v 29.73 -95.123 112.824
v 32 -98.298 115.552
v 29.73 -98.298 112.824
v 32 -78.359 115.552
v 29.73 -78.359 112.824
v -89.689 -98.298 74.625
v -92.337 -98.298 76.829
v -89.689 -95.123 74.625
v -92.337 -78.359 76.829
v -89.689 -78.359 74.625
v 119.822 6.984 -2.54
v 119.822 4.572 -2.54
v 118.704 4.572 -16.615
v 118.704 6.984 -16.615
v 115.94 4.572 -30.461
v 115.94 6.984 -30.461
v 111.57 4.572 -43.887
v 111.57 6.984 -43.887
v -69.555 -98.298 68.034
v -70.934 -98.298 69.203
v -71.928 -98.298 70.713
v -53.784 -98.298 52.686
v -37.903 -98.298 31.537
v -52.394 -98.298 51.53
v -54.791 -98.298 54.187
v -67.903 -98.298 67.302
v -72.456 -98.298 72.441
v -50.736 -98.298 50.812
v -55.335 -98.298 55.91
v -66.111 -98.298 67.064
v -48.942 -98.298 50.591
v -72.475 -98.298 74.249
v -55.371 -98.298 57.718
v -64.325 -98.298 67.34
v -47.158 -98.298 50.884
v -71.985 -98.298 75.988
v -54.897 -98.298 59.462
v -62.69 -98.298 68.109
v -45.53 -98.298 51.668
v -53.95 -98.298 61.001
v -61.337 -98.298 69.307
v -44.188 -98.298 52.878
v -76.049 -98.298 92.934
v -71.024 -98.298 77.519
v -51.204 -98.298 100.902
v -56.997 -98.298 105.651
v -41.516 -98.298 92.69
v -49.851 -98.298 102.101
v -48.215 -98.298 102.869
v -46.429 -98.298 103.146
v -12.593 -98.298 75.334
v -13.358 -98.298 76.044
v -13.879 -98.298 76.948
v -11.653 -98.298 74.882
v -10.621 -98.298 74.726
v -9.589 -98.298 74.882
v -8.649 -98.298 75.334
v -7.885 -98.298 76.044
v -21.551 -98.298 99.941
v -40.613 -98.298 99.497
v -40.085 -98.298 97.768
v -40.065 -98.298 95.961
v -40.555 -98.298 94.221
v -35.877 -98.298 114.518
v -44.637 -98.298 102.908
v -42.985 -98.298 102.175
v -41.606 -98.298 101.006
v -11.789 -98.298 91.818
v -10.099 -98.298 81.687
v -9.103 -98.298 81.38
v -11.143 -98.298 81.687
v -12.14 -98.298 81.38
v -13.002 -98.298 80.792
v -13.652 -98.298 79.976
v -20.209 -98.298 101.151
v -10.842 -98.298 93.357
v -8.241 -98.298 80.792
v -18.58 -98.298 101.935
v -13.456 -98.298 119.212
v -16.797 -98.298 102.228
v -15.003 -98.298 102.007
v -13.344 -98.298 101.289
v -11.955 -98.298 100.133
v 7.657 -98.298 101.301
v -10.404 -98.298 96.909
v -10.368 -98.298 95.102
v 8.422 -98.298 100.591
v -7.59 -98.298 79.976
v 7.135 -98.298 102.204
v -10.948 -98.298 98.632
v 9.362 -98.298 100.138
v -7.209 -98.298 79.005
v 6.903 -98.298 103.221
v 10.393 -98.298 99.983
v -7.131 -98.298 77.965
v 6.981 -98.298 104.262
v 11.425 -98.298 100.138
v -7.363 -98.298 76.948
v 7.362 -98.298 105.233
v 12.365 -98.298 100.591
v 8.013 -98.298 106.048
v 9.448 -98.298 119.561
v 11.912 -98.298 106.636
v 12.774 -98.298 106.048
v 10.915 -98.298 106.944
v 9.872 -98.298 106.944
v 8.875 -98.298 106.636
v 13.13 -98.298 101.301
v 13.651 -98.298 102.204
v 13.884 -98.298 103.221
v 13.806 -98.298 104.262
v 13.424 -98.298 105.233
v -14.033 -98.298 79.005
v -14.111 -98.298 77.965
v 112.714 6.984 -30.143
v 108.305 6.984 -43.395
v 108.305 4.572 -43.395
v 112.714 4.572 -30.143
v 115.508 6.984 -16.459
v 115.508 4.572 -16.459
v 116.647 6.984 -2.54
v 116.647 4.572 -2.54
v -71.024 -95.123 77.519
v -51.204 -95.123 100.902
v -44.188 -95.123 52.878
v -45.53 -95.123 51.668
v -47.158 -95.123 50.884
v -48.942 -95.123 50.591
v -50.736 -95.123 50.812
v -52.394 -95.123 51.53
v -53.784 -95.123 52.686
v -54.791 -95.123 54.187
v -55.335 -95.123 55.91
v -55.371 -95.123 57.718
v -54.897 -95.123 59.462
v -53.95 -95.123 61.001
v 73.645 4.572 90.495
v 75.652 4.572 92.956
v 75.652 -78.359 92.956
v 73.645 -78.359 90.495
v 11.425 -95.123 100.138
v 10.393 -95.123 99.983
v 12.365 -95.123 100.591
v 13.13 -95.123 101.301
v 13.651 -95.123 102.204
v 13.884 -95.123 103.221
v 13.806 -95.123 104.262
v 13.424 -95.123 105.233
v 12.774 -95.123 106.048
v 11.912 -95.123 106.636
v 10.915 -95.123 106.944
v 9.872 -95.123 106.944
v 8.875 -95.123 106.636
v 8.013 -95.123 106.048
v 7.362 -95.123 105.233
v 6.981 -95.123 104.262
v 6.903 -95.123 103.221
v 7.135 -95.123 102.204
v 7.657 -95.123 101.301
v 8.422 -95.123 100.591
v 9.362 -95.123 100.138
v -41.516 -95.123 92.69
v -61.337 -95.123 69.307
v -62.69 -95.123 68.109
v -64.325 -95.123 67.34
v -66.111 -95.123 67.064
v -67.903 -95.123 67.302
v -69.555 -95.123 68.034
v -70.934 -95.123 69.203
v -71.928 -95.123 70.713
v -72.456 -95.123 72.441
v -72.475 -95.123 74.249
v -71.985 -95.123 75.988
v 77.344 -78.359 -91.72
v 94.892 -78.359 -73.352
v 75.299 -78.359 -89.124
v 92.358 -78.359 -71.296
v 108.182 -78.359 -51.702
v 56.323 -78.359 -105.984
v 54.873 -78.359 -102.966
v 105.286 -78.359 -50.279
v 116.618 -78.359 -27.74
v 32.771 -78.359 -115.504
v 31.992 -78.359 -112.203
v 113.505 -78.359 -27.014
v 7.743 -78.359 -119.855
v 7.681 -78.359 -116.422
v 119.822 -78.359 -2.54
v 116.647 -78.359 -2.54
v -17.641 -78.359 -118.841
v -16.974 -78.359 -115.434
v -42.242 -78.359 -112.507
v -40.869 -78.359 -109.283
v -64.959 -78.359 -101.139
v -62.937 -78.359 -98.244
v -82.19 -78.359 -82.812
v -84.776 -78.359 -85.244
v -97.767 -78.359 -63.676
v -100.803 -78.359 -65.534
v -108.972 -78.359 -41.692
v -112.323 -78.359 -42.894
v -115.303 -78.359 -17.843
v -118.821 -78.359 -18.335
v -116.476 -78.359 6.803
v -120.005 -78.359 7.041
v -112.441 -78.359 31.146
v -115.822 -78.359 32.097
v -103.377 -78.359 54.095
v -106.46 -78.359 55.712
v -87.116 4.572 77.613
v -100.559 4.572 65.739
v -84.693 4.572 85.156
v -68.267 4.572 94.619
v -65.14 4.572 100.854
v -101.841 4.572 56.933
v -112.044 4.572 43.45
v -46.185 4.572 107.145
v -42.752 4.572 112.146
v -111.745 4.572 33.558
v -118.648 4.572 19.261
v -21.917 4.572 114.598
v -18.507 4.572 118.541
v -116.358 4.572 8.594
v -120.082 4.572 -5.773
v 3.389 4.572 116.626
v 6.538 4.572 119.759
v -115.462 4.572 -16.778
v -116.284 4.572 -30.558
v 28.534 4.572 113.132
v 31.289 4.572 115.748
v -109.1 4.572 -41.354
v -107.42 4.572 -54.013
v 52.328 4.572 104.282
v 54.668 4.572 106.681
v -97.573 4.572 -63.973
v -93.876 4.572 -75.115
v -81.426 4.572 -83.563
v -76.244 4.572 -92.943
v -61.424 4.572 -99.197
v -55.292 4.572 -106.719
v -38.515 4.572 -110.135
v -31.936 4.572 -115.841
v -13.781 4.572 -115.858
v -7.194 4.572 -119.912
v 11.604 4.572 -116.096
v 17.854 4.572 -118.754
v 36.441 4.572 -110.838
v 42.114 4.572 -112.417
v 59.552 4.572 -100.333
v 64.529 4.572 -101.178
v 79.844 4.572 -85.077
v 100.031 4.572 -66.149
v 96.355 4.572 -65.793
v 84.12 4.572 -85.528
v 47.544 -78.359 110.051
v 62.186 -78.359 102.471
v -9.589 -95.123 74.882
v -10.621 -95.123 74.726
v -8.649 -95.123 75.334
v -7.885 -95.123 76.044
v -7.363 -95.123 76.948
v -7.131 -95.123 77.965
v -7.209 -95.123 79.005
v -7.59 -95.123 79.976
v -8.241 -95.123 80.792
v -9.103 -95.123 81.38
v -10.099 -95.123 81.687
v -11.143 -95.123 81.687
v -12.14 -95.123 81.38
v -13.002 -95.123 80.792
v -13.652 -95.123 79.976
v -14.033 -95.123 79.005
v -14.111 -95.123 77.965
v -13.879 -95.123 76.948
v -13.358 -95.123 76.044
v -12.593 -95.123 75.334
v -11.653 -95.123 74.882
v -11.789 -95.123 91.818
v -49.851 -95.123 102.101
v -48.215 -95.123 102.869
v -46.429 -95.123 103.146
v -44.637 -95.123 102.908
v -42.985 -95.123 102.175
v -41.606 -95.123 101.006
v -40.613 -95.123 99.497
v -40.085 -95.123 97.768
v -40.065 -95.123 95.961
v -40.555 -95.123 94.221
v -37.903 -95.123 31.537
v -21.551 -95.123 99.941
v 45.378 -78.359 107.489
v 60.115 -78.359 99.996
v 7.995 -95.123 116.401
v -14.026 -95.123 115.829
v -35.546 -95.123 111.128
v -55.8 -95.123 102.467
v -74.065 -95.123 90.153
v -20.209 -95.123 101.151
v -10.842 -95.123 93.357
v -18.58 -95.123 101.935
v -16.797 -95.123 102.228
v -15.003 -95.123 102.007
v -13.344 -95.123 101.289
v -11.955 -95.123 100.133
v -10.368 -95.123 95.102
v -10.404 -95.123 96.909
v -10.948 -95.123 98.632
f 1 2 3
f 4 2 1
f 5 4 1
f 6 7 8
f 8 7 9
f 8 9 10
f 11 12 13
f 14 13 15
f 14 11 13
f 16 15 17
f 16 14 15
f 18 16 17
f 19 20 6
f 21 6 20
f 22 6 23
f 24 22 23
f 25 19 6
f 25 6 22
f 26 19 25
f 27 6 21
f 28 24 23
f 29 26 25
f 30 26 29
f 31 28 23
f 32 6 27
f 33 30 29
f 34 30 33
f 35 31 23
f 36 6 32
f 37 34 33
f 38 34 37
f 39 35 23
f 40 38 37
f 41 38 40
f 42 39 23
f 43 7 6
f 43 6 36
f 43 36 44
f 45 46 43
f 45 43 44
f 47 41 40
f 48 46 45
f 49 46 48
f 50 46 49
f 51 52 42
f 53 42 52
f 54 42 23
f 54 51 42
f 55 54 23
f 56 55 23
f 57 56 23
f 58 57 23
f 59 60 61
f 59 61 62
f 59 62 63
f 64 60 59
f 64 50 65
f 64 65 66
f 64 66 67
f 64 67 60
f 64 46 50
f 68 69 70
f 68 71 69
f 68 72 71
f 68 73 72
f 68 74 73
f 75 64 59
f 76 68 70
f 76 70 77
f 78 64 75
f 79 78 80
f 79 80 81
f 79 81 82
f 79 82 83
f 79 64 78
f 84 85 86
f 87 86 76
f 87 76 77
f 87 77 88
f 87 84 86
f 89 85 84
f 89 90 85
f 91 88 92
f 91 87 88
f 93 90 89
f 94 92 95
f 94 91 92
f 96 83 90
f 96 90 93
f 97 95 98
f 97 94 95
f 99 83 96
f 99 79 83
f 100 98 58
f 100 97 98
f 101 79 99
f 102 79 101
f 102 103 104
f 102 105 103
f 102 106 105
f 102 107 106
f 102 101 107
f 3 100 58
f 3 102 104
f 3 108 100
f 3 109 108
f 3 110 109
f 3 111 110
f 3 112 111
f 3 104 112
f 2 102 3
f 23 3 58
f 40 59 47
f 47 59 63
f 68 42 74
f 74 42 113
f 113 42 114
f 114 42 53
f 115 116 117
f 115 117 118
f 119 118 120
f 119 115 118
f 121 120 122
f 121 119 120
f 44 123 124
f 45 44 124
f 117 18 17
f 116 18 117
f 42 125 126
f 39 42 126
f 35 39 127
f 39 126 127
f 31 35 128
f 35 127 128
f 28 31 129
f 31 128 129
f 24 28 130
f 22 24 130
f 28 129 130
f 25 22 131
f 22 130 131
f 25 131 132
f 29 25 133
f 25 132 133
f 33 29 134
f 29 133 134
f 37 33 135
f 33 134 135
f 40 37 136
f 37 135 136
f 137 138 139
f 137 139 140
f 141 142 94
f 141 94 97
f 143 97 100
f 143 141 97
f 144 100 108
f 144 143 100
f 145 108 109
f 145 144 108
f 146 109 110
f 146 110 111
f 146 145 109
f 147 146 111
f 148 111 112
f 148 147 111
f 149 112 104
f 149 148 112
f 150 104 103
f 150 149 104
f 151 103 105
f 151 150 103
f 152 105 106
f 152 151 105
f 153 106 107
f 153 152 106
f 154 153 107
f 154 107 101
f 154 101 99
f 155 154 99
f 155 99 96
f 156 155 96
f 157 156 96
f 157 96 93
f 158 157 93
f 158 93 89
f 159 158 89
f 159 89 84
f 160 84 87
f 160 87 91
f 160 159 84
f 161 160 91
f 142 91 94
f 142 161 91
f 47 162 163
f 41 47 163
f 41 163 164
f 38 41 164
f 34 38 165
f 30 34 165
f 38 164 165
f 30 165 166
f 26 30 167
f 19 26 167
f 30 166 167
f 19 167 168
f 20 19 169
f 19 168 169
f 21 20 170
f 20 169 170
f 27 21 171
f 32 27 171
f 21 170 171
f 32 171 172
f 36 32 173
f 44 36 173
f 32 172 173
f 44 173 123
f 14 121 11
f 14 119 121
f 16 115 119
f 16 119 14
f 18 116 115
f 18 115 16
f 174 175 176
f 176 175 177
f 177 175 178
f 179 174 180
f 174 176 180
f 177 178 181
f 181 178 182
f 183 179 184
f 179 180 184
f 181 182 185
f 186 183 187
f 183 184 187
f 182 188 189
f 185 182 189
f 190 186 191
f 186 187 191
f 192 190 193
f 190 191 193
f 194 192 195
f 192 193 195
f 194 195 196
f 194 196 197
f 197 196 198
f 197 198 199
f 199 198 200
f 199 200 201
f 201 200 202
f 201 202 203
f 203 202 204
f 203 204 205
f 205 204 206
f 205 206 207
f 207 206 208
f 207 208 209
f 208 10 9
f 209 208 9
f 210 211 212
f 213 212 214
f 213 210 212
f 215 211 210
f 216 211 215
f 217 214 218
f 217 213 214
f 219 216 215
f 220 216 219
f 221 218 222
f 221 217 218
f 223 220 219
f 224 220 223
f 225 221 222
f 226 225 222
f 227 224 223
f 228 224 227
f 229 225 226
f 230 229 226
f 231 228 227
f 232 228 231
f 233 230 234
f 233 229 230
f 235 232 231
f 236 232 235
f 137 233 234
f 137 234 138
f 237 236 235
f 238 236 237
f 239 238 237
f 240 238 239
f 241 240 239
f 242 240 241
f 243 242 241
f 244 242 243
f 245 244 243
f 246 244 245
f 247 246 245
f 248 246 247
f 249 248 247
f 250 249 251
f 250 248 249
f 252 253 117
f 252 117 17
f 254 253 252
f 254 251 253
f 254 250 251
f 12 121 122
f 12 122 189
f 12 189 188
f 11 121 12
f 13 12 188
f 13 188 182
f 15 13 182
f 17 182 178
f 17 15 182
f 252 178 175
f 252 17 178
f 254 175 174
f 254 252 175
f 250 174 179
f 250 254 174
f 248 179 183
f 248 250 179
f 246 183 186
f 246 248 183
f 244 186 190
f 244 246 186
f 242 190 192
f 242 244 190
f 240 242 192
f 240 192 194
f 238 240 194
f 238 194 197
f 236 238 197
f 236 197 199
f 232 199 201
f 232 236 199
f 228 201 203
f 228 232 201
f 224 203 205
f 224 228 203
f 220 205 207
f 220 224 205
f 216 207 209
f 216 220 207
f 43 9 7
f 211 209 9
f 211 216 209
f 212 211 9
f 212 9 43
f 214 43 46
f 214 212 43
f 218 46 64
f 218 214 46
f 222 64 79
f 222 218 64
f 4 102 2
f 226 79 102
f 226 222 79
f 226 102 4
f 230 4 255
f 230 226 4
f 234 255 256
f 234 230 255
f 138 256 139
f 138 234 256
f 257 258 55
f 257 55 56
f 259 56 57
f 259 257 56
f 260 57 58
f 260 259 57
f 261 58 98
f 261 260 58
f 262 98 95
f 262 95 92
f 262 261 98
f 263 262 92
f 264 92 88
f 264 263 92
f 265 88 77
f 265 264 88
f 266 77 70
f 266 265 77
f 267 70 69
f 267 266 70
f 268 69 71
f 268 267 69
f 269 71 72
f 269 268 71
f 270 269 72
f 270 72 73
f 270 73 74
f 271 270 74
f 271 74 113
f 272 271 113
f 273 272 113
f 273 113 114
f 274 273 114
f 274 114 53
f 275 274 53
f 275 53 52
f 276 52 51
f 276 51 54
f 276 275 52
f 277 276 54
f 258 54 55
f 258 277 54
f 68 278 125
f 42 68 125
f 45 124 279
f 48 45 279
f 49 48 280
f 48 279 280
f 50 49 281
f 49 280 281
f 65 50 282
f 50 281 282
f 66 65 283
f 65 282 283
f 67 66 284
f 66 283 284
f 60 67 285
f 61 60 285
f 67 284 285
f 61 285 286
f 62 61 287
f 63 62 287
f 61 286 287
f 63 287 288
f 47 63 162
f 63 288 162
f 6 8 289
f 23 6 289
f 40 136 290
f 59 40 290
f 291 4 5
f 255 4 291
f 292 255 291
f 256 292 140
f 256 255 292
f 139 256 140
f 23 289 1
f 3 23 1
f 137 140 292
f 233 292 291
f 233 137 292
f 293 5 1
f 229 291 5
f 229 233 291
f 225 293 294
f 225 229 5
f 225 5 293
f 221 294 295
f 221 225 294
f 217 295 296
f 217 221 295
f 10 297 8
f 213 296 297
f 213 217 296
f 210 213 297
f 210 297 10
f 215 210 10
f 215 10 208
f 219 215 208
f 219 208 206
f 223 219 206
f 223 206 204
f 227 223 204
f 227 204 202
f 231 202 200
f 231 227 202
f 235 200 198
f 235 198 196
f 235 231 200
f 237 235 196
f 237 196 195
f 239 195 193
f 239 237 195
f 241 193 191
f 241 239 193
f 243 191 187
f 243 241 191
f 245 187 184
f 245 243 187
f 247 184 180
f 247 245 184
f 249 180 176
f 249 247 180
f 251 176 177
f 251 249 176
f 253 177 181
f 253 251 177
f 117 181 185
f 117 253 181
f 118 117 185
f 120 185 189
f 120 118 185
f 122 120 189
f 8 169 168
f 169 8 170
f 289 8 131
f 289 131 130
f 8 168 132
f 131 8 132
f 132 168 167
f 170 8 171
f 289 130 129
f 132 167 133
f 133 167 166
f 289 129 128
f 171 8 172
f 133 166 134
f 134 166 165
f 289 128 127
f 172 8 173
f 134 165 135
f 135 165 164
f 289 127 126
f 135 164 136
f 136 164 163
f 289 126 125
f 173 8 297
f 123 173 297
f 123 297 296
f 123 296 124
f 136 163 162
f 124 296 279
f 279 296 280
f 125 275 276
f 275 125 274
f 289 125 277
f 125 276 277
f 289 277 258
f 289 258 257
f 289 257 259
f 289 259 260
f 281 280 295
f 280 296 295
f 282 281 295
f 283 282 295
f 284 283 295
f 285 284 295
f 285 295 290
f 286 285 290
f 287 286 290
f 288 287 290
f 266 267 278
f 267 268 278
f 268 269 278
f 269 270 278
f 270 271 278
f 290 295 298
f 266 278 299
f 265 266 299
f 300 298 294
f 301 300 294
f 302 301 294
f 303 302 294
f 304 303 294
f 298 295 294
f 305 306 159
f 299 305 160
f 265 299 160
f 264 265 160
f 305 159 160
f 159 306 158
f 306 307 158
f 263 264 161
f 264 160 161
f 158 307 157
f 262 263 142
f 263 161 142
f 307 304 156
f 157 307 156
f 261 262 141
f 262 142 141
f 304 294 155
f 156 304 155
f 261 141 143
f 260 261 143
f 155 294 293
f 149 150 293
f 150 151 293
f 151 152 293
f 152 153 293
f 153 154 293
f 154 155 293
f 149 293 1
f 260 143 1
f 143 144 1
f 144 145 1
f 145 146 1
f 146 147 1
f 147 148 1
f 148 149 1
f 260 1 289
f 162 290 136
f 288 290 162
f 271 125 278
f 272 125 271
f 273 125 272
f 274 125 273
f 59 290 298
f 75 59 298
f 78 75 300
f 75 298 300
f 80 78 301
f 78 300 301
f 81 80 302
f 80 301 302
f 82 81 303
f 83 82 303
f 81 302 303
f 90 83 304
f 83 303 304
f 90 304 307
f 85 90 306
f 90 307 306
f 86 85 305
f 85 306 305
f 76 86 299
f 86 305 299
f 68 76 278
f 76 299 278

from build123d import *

# Parameters (mm, degrees)
BASE_FLANGE1_DEPTH  = 98.298
CUT_EXTRUDE1_START  = -19.939
CUT_EXTRUDE1_DEPTH  = 19.939
BOSS_EXTRUDE3_START = -3.175
SKETCH13_R          = 3.5
BOSS_EXTRUDE3_DEPTH = 3.175
BOSS_EXTRUDE4_START = 4.572
BOSS_EXTRUDE4_DEPTH = 4.572
BOSS_EXTRUDE5_START = 2.4115014
BOSS_EXTRUDE5_DEPTH = 2.4115014


# Sheet-metal steps are written as plain solids
with BuildPart() as part:
    # Sketch3 → Base-Flange1 (new body)
    with BuildSketch(Plane(origin=(0, 0, 0), x_dir=(1, 0, 0), z_dir=(0, 1, 0))):
        with BuildLine():
            Line((116.647348933, 2.54), (119.822348933, 2.54))
            ThreePointArc((119.822348933, 2.54), (-109.127582861, 50.474671088), (75.651891683, -92.955973295))
            Line((75.651891683, -92.955973295), (73.645289253, -90.495452836))
            ThreePointArc((73.645289253, -90.495452836), (-105.909021844, 48.952371802), (116.647348933, 2.54))
        make_face()
    extrude(amount=-BASE_FLANGE1_DEPTH)

    # Sketch11 → Cut-Extrude1 (cut)
    with BuildSketch(Plane.XZ.offset(98.298).offset(CUT_EXTRUDE1_START)):
        with BuildLine():
            Line((32.000435674, 115.55214828), (29.730194096, 112.823628607))
            ThreePointArc((29.730194096, 112.823628607), (52.879669985, 104.003827407), (73.645289253, 90.495452836))
            Line((73.645289253, 90.495452836), (75.651891683, 92.955973295))
            ThreePointArc((75.651891683, 92.955973295), (54.995189309, 106.512393046), (32.000435674, 115.55214828))
        make_face()
        with BuildLine():
            Line((-92.337333522, 76.828501251), (-89.68916988, 74.625119225))
            ThreePointArc((-89.68916988, 74.625119225), (-40.869300957, -109.282916562), (116.647348933, -2.54))
            Line((116.647348933, -2.54), (119.822348933, -2.54))
            ThreePointArc((119.822348933, -2.54), (-42.24188113, -112.507437016), (-92.337333522, 76.828501251))
        make_face()
    extrude(amount=CUT_EXTRUDE1_DEPTH, mode=Mode.SUBTRACT)

    # Sketch13 → Boss-Extrude3 (add)
    with BuildSketch(Plane.XZ.offset(98.298).offset(BOSS_EXTRUDE3_START)):
        with BuildLine():
            Line((-37.903446615, 31.537248793), (29.730194096, 112.823628607))
            ThreePointArc((29.730194096, 112.823628607), (-35.546465704, 111.128323973), (-89.68916988, 74.625119225))
            Line((-89.68916988, 74.625119225), (-37.903446615, 31.537248793))
        make_face()
        with Locations(Location((-10.621108202, 78.226237974, 0), (0, 0, 270))):
            Circle(SKETCH13_R, mode=Mode.SUBTRACT)
        with Locations(Location((10.39338393, 103.482781479, 0), (0, 0, 270))):
            Circle(SKETCH13_R, mode=Mode.SUBTRACT)
        with BuildLine():
            Line((-53.950312206, 61.001291051), (-21.551148637, 99.940651521))
            ThreePointArc((-21.551148637, 99.940651521), (-12.608395426, 100.76050822), (-11.788538727, 91.817755009))
            Line((-11.788538727, 91.817755009), (-44.187702296, 52.878394539))
            ThreePointArc((-44.187702296, 52.878394539), (-53.130455507, 52.05853784), (-53.950312206, 61.001291051))
        make_face(mode=Mode.SUBTRACT)
        with BuildLine():
            Line((-71.024350753, 77.519358691), (-51.203588088, 100.902170675))
            ThreePointArc((-51.203588088, 100.902170675), (-42.25369967, 101.640071282), (-41.515799064, 92.690182864))
            Line((-41.515799064, 92.690182864), (-61.336561728, 69.30737088))
            ThreePointArc((-61.336561728, 69.30737088), (-70.286450146, 68.569470273), (-71.024350753, 77.519358691))
        make_face(mode=Mode.SUBTRACT)
    extrude(amount=BOSS_EXTRUDE3_DEPTH)

    # Sketch14 → Boss-Extrude4 (add)
    with BuildSketch(Plane(origin=(0, 0, 0), x_dir=(1, 0, 0), z_dir=(0, 1, 0)).offset(BOSS_EXTRUDE4_START)):
        with BuildLine():
            Line((116.647348933, 2.54), (119.822348933, 2.54))
            ThreePointArc((119.822348933, 2.54), (-109.127582861, 50.474671088), (75.651891683, -92.955973295))
            Line((75.651891683, -92.955973295), (73.645289253, -90.495452836))
            ThreePointArc((73.645289253, -90.495452836), (-105.909021844, 48.952371802), (116.647348933, 2.54))
        make_face()
    extrude(amount=-BOSS_EXTRUDE4_DEPTH)

    # Sketch15 → Boss-Extrude5 (add)
    with BuildSketch(Plane(origin=(0, 4.572, 0), x_dir=(1, 0, 0), z_dir=(0, 1, 0)).offset(BOSS_EXTRUDE5_START)):
        with BuildLine():
            Line((116.647348933, 2.54), (119.822348933, 2.54))
            ThreePointArc((119.822348933, 2.54), (117.525772125, 23.578469398), (111.569940957, 43.886584395))
            Line((111.569940957, 43.886584395), (108.304935184, 43.394661284))
            ThreePointArc((108.304935184, 43.394661284), (114.316045984, 23.343034156), (116.647348933, 2.54))
        make_face()
    extrude(amount=-BOSS_EXTRUDE5_DEPTH)


solid = part.part
